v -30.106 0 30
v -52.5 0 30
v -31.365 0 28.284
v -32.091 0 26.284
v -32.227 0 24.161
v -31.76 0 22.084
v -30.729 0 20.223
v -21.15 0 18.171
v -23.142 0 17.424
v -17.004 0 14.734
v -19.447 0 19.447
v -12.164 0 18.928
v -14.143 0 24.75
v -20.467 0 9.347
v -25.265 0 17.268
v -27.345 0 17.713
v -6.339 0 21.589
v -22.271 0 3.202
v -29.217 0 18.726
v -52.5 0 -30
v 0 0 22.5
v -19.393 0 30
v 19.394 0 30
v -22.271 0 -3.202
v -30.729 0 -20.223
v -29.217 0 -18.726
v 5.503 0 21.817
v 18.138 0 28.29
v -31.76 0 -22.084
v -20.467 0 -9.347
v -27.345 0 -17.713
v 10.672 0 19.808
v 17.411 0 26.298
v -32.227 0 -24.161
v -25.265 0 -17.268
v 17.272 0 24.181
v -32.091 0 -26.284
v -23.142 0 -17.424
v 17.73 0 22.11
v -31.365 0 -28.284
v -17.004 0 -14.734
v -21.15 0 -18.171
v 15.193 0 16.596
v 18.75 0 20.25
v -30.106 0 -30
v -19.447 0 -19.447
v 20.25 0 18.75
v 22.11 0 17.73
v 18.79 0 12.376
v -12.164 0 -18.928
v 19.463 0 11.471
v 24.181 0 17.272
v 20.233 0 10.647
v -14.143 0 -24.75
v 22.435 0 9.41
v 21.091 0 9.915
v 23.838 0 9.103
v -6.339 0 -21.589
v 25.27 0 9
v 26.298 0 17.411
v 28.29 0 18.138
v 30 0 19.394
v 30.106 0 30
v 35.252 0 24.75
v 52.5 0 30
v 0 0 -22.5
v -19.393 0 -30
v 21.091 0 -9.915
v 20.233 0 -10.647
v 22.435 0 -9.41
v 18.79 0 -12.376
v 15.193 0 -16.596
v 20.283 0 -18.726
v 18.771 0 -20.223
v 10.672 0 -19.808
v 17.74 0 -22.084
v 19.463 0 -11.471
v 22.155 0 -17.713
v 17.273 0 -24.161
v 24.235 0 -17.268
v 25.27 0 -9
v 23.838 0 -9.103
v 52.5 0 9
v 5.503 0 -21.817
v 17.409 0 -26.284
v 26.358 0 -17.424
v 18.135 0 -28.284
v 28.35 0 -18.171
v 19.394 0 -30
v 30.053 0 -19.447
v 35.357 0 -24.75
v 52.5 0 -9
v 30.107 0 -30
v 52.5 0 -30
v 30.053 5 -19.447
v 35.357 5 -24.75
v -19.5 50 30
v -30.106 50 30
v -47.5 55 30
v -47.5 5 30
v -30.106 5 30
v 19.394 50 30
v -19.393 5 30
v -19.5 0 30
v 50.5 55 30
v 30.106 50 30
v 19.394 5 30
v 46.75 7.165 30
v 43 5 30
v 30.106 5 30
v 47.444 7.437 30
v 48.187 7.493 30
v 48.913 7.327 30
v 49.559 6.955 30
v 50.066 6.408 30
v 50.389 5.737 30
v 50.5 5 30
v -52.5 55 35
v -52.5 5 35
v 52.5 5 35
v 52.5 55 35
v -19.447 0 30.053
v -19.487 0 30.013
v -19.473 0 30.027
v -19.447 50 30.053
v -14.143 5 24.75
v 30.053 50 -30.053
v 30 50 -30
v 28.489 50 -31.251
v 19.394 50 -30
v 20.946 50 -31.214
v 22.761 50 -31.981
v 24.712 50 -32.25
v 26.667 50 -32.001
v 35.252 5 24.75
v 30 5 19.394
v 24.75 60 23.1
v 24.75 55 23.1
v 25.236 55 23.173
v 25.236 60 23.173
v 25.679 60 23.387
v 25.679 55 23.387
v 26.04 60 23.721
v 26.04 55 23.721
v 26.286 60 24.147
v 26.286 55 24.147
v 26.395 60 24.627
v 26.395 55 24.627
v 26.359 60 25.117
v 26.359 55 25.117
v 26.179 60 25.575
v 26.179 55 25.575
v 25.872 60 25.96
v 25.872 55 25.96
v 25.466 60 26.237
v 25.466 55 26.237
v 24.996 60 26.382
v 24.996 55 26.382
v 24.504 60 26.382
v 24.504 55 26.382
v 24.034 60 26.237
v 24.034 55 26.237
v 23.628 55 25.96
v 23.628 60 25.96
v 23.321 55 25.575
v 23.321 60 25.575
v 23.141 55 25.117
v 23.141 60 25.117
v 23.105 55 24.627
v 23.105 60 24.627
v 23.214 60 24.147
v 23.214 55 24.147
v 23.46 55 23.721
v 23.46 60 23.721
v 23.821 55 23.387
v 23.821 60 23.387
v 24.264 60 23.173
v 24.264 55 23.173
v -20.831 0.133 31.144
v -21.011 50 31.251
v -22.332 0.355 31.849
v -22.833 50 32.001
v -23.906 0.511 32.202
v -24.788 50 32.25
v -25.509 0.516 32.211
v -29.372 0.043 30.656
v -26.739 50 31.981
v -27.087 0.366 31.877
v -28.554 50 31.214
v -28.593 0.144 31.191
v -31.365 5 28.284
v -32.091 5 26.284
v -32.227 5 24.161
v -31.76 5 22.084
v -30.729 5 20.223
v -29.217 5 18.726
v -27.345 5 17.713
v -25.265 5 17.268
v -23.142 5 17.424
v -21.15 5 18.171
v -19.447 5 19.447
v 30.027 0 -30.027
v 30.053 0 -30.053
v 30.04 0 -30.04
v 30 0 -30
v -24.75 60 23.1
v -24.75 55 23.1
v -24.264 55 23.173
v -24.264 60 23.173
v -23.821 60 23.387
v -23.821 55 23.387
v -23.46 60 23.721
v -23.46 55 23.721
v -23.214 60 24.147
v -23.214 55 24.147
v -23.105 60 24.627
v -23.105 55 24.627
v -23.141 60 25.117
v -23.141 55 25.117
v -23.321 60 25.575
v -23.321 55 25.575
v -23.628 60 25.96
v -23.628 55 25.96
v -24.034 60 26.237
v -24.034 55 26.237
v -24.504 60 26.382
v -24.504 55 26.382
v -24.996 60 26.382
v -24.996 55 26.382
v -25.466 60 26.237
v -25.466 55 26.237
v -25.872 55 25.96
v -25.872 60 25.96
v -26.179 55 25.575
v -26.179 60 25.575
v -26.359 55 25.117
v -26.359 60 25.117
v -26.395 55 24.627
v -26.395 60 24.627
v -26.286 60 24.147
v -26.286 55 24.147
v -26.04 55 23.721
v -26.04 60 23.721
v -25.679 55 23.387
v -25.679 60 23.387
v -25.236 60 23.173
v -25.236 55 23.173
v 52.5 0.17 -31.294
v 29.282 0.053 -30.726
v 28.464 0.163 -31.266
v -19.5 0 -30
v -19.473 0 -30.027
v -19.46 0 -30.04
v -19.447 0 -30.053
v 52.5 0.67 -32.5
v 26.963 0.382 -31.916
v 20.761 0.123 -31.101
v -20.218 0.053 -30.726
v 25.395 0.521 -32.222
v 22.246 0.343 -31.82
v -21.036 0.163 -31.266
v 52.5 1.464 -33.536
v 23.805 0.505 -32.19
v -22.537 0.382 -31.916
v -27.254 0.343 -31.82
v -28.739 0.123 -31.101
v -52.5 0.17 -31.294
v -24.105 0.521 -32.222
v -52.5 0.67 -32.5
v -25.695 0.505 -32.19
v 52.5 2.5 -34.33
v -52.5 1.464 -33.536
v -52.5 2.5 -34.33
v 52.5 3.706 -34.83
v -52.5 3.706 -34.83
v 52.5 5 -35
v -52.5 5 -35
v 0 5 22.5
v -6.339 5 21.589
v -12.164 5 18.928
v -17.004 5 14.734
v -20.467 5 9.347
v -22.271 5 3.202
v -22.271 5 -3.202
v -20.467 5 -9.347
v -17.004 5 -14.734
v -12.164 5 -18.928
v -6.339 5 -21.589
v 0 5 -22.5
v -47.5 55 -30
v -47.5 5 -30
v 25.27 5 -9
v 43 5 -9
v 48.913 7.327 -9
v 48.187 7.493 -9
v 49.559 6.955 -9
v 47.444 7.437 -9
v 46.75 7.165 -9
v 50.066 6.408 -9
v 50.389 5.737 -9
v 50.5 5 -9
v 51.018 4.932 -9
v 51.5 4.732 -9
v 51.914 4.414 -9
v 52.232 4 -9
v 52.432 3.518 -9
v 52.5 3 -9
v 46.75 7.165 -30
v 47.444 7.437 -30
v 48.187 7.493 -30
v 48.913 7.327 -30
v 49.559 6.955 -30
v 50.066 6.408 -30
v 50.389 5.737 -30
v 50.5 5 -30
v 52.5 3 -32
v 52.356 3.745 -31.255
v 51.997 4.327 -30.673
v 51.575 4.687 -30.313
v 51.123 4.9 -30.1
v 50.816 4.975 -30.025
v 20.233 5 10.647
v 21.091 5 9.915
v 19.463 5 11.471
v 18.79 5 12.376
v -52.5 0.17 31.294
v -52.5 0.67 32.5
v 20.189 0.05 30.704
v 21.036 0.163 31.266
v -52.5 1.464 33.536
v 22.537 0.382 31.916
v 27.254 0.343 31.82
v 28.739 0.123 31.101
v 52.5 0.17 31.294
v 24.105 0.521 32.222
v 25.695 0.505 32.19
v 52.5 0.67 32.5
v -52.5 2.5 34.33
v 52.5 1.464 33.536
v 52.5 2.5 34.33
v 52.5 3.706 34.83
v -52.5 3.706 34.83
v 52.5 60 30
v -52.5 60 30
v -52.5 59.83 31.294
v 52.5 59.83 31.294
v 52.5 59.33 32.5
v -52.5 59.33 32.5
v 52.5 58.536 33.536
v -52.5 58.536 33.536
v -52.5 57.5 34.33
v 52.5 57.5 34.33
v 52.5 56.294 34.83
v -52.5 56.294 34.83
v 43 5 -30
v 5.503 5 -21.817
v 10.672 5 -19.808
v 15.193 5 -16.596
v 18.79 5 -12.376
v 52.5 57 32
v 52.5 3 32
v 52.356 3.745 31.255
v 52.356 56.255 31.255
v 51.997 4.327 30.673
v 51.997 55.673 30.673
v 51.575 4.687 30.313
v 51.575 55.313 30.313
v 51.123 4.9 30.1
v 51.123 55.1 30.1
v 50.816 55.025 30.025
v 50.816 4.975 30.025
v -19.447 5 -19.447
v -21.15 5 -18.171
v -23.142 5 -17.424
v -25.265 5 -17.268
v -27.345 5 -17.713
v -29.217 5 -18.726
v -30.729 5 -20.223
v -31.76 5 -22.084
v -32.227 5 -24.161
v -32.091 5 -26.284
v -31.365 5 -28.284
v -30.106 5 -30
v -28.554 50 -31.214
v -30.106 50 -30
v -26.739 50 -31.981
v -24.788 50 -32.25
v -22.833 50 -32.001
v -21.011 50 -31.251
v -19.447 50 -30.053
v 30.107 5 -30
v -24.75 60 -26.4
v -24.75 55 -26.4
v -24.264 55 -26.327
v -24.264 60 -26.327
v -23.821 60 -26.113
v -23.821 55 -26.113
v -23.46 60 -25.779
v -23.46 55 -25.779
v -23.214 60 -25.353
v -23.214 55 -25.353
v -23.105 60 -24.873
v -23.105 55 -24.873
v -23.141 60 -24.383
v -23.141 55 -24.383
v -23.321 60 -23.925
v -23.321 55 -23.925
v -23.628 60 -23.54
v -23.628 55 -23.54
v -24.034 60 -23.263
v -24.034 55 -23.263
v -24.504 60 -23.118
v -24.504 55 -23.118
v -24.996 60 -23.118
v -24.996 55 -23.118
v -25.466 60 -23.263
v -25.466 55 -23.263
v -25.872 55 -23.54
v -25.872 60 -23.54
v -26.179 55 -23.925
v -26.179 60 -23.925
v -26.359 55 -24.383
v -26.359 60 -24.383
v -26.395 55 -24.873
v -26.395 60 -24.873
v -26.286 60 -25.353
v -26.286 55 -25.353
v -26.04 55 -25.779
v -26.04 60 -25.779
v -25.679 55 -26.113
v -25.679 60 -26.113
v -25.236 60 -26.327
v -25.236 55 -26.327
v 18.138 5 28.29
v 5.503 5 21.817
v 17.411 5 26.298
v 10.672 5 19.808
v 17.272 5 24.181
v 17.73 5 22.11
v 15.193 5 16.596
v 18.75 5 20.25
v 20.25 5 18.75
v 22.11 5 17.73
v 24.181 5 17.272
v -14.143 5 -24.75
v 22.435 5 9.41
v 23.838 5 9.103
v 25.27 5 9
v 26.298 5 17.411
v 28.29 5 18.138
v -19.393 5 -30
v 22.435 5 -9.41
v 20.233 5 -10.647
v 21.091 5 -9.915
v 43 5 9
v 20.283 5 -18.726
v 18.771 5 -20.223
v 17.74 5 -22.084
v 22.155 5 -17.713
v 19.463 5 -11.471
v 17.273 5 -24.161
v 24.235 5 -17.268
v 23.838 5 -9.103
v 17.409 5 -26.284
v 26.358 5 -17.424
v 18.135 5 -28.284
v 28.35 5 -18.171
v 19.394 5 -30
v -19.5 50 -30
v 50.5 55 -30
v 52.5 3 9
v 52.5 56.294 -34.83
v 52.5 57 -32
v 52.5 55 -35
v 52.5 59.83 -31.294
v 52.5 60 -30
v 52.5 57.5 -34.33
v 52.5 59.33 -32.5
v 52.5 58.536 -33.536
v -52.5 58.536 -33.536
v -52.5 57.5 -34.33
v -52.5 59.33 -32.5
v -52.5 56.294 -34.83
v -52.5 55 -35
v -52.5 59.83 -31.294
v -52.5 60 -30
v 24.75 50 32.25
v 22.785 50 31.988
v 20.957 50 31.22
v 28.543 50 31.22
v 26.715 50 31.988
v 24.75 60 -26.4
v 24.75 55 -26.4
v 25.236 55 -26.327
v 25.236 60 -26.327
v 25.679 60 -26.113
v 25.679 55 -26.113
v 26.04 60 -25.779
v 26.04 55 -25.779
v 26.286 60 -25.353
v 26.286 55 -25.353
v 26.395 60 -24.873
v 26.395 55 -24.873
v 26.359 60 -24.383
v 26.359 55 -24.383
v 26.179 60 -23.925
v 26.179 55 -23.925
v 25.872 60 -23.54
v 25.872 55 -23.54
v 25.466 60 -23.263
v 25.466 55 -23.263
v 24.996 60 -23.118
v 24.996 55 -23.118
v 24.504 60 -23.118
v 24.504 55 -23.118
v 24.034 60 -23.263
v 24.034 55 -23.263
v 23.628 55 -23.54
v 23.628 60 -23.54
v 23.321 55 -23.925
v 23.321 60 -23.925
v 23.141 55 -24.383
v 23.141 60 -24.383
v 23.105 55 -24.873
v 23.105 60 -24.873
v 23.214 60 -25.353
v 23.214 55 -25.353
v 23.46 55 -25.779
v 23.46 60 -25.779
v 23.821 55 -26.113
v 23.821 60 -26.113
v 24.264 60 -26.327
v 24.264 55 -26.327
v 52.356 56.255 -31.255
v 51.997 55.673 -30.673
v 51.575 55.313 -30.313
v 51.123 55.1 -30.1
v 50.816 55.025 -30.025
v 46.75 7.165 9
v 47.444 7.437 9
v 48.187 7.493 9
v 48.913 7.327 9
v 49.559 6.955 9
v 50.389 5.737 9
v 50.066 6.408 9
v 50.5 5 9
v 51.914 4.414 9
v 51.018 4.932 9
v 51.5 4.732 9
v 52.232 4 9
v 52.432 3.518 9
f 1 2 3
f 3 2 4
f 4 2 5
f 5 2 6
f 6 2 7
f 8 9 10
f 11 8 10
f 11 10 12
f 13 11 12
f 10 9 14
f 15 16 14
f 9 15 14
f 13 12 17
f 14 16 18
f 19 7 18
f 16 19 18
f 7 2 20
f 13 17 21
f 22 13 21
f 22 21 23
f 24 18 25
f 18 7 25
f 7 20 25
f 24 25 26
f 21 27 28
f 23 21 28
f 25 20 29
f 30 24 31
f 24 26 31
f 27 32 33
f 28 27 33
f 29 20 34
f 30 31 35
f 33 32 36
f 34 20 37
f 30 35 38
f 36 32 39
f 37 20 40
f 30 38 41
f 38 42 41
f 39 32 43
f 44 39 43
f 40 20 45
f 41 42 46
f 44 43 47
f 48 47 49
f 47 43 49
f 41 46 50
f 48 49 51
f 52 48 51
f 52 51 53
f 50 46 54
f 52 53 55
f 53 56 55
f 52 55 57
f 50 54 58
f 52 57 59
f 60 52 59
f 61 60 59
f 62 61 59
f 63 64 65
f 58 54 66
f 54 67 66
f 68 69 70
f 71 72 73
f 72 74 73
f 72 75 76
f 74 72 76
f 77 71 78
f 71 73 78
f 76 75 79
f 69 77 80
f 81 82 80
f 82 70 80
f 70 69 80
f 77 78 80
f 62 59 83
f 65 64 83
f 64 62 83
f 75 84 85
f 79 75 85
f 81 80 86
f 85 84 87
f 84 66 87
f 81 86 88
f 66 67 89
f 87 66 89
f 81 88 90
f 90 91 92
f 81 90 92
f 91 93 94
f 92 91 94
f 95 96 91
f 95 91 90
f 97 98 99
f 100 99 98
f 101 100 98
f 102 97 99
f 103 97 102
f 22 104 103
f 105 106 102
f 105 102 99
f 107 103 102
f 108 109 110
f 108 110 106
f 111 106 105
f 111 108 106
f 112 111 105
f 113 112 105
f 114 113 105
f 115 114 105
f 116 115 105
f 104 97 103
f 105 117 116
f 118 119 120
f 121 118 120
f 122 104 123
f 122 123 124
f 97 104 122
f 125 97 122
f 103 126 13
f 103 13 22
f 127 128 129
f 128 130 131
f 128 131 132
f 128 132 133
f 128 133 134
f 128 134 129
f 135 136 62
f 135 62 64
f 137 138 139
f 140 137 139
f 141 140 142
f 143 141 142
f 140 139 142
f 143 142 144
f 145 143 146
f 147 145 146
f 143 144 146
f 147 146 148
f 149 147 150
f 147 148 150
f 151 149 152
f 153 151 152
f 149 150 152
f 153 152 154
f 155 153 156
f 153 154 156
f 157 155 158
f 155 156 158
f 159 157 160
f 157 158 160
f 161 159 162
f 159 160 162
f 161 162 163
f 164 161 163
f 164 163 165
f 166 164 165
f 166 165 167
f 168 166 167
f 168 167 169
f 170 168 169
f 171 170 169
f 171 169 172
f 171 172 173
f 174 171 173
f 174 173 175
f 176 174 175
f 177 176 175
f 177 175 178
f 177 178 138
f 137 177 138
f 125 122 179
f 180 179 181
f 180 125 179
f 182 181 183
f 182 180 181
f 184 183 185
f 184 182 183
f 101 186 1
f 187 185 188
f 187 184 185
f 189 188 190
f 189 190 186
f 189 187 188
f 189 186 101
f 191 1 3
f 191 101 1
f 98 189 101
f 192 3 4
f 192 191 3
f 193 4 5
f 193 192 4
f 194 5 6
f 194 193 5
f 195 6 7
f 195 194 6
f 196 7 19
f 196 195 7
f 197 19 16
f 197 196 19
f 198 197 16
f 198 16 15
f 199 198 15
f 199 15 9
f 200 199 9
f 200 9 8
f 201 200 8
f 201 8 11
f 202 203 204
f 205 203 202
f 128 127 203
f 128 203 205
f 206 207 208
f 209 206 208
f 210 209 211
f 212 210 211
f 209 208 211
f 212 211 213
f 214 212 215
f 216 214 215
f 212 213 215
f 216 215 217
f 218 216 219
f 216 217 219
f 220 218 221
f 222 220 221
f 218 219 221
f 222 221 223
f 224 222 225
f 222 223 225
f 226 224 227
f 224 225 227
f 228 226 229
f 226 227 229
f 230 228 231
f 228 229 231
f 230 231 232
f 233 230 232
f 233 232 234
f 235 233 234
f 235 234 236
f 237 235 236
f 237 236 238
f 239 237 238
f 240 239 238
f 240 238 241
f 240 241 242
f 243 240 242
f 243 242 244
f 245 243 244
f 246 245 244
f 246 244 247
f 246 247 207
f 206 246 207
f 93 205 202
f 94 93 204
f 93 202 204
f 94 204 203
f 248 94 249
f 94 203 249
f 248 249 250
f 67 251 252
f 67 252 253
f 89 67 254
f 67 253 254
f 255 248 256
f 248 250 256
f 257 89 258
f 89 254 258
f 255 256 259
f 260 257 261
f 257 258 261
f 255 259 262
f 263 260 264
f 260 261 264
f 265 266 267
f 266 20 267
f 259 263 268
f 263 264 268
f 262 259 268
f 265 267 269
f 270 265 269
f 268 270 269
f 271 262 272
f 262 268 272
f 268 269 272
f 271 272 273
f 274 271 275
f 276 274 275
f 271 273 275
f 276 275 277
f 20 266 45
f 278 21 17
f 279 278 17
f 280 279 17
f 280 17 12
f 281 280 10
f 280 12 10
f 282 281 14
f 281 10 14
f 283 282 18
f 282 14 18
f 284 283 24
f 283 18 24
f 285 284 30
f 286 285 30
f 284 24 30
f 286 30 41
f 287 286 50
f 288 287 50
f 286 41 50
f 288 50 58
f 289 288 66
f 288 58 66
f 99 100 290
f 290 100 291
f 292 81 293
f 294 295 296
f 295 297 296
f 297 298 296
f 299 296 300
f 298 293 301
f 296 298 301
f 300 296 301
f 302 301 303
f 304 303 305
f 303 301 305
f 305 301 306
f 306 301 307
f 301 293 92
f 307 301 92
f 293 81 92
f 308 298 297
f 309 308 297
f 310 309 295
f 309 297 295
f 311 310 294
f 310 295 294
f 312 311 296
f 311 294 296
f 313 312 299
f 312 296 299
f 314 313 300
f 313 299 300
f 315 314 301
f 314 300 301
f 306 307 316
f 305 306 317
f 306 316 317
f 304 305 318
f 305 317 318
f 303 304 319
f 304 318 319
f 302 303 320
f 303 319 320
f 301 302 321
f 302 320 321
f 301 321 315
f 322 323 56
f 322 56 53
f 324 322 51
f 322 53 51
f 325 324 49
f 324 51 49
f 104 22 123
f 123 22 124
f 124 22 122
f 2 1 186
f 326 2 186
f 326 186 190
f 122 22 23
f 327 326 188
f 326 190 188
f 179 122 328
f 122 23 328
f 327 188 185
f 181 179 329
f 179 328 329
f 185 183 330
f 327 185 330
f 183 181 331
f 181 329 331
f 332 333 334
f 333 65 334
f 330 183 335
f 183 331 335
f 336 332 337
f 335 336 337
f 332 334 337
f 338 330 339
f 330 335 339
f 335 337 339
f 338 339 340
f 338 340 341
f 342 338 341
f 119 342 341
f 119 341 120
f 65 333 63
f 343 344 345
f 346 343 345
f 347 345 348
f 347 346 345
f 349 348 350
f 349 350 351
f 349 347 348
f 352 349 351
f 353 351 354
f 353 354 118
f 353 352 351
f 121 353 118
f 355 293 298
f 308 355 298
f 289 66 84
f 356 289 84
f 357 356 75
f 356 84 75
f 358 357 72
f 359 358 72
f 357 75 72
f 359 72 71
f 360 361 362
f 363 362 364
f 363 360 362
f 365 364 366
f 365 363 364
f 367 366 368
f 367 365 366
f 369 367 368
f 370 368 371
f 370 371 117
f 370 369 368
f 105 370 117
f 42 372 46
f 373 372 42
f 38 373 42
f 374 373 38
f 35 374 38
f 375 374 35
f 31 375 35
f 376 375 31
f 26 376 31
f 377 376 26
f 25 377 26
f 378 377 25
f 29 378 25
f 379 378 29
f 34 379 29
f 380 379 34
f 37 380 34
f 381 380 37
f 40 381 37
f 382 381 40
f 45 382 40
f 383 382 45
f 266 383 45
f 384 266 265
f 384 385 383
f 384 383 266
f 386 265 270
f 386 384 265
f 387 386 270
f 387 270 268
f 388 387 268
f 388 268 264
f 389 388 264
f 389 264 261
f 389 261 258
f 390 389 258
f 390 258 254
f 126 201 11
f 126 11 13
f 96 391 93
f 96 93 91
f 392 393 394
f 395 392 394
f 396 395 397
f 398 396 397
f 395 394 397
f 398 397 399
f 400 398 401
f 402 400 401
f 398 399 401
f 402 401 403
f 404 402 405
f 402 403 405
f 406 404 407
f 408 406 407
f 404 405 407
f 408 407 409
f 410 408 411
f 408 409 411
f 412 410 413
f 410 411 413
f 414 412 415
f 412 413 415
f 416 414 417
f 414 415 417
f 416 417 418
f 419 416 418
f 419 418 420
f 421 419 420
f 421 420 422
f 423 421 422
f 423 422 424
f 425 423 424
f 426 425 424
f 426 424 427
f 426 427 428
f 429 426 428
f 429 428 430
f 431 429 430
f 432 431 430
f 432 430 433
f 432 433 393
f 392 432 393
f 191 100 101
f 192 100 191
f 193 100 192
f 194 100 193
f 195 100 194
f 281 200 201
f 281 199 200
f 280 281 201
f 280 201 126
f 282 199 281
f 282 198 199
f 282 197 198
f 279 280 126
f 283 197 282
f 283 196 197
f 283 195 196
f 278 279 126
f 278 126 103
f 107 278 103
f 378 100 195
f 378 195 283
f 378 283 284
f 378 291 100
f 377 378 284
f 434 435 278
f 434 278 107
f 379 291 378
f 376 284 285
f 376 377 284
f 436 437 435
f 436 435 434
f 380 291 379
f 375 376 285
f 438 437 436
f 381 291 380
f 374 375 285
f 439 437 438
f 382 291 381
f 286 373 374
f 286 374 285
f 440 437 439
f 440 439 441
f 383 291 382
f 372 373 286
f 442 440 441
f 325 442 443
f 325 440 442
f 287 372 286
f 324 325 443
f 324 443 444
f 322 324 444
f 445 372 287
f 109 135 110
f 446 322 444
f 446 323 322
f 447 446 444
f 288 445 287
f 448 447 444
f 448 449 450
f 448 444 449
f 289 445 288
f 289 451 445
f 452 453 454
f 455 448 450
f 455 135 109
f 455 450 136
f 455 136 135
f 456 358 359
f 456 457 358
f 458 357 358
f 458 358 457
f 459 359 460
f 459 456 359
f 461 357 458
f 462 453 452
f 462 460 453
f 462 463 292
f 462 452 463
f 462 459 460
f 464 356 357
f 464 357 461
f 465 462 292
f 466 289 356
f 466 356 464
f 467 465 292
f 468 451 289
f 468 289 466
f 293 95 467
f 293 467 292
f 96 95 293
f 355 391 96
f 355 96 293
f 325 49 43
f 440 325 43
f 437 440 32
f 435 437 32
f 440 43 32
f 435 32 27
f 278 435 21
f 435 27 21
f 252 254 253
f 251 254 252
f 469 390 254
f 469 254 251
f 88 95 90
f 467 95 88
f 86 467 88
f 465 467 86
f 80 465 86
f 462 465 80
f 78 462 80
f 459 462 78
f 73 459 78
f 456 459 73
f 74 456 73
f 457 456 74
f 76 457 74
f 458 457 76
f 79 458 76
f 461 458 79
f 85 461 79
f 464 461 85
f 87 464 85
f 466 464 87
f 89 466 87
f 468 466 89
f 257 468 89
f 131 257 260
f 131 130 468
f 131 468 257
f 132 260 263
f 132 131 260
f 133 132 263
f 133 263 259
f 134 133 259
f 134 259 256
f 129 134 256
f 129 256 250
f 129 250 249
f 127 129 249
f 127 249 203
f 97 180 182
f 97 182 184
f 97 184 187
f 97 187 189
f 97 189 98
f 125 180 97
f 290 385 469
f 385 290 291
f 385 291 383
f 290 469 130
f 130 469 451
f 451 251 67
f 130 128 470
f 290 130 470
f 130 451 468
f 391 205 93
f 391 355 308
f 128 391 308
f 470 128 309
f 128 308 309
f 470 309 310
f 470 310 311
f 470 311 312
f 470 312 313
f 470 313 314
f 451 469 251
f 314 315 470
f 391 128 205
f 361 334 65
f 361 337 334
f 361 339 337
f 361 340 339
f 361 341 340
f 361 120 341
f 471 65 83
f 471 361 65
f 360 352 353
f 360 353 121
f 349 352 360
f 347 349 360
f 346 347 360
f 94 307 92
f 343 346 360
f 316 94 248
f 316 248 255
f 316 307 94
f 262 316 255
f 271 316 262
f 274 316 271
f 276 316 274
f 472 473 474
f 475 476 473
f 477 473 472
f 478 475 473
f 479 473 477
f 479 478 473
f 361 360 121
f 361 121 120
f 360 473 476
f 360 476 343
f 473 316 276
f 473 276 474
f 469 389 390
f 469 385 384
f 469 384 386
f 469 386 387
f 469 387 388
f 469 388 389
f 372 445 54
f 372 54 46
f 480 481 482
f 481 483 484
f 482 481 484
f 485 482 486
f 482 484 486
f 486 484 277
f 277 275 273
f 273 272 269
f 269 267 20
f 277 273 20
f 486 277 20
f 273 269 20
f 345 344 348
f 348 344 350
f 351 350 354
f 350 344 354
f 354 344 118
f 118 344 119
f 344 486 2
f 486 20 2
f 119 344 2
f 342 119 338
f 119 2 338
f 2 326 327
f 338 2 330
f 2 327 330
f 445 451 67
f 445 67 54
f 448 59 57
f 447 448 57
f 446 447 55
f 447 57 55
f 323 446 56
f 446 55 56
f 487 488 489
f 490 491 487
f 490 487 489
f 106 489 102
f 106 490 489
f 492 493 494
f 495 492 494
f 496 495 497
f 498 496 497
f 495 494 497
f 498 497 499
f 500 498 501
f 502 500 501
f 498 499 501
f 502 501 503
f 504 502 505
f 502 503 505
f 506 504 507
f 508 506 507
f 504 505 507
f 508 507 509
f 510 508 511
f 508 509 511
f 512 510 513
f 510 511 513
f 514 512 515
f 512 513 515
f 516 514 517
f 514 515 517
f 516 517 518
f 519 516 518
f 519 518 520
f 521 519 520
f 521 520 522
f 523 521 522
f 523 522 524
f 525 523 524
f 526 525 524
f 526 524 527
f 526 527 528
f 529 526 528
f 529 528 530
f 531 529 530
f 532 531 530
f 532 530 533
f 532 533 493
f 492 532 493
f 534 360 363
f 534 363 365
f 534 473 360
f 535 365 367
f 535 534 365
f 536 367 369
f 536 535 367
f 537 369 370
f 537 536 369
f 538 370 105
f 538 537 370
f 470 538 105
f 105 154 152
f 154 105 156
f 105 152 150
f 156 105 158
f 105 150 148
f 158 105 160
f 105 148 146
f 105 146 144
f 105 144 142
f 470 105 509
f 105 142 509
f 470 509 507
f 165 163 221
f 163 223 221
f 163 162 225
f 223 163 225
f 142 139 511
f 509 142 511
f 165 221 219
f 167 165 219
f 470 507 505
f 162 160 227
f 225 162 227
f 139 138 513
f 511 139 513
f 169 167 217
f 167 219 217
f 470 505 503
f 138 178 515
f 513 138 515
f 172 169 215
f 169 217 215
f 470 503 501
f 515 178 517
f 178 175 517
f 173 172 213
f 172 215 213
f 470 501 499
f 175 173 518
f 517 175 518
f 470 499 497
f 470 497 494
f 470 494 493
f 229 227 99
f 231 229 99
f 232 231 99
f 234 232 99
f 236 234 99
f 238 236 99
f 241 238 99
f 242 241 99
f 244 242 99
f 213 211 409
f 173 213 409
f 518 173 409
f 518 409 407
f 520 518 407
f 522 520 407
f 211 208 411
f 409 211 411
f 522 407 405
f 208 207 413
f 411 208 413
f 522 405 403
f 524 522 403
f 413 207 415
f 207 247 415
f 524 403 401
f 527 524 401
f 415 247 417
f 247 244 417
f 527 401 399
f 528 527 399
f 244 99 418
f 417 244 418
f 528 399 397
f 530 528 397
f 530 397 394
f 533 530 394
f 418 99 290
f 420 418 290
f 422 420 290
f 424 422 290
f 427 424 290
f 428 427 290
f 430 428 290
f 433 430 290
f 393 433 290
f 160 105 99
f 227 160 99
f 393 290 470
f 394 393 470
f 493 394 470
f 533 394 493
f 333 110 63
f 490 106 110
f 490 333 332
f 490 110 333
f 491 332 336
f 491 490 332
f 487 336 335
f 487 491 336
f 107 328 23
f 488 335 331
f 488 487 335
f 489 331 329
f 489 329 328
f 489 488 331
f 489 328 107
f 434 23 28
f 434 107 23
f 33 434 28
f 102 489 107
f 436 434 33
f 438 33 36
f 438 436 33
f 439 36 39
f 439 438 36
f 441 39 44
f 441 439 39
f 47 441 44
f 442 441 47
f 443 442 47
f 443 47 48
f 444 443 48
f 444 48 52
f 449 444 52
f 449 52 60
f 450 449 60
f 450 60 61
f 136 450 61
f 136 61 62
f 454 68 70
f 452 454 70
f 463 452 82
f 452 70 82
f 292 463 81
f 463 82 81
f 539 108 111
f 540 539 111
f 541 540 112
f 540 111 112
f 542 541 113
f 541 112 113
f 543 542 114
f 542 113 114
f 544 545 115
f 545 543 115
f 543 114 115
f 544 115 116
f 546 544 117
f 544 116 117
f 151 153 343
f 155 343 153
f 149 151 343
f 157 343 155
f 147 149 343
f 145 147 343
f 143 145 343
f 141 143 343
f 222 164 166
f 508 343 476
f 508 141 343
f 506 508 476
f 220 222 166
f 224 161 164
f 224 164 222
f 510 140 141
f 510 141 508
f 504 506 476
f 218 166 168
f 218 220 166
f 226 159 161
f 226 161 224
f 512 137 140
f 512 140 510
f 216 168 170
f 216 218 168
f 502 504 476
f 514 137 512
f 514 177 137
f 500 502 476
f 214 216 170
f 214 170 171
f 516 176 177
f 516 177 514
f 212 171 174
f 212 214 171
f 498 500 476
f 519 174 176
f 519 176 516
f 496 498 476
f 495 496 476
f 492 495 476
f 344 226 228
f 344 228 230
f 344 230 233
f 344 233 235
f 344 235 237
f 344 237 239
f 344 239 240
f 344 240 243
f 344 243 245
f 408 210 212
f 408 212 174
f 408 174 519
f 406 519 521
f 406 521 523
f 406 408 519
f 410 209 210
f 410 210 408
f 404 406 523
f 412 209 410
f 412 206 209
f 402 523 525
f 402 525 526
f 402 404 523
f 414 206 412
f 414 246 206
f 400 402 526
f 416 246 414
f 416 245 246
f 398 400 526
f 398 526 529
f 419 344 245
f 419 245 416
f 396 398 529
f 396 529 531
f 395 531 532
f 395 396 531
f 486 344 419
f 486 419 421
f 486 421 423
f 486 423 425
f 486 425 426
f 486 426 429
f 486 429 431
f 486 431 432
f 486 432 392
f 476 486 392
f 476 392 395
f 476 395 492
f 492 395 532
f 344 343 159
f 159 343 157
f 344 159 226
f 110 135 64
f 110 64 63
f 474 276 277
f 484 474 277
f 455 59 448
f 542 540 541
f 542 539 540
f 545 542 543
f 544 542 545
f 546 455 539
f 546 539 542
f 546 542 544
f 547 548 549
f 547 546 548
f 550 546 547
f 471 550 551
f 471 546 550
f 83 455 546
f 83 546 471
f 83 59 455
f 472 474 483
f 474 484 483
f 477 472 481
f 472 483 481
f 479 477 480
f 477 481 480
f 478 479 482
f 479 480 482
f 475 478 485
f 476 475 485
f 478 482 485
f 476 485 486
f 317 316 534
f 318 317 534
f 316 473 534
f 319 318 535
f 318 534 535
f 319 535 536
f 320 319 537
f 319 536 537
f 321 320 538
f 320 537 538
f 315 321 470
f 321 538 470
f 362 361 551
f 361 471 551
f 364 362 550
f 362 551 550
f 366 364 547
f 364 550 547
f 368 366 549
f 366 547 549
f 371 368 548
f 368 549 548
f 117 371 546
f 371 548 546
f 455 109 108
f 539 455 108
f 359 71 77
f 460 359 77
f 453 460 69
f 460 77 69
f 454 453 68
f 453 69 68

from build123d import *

# Parameters (mm, degrees)
EXTRUDE_1_DEPTH     = 5
SKETCH_3_W          = 100
SKETCH_3_H          = 5
SKETCH_3_W_2        = 5
SKETCH_3_H_2        = 60
EXTRUDE_2_DEPTH     = 55
SKETCH_4_W          = 60
SKETCH_4_H          = 5
EXTRUDE_3_DEPTH     = 100
CUT_EXTRUDE_1_REACH = 89.07
FILLET_2_R          = 10
FILLET_3_R          = 10
FILLET_4_R          = 5
FILLET_5_R          = 2
CUT_EXTRUDE_2_REACH = 85.703
SKETCH_6_R          = 1.65
CUT_EXTRUDE_START   = -50
CUT_EXTRUDE_3_DEPTH = 50
EXTRUDE_4_DEPTH     = 60
SKETCH_10_W         = 7.5
SKETCH_10_H         = 18
CUT_EXTRUDE_4_DEPTH = 5


# Read off the part's stored shape, not the designer's step: 切除-拉伸3
with BuildPart() as part:
    # 草图1 → 凸台-拉伸1 (new body)
    with BuildSketch(Plane(origin=(0, 0, 0), x_dir=(1, 0, 0), z_dir=(0, 1, 0))):
        Polygon((-52.5, 35), (-52.5, -35), (52.5, -35), (52.5, -9), (-20, -9), (-20, 9), (52.5, 9), (52.5, 35), align=None)
    extrude(amount=EXTRUDE_1_DEPTH)

    # 草图3 → 凸台-拉伸2 (add)
    with BuildSketch(Plane(origin=(0, 5, 0), x_dir=(1, 0, 0), z_dir=(0, 1, 0))):
        with Locations((2.5, 32.5)):
            Rectangle(SKETCH_3_W, SKETCH_3_H)
        with Locations((-50, 32.5)):
            Rectangle(SKETCH_3_W_2, SKETCH_3_H)
        with Locations((-50, 0)):
            Rectangle(SKETCH_3_W_2, SKETCH_3_H_2)
        with Locations((2.5, -32.5)):
            Rectangle(SKETCH_3_W, SKETCH_3_H)
        with Locations((-50, -32.5)):
            Rectangle(SKETCH_3_W_2, SKETCH_3_H)
    extrude(amount=EXTRUDE_2_DEPTH)

    # 草图4 → 凸台-拉伸3 (add)
    with BuildSketch(Plane(origin=(-47.5, 0, 0), x_dir=(0, 0, -1), z_dir=(1, 0, 0))):
        with Locations((0, 57.5)):
            Rectangle(SKETCH_4_W, SKETCH_4_H)
    extrude(amount=EXTRUDE_3_DEPTH)

    # 草图5 → 切除-拉伸1 (cut, up to next)
    with BuildSketch(Plane.XZ, mode=Mode.PRIVATE) as cut_extrude_1_sk1:
        with BuildLine():
            Line((19.852941176, 10.588235294), (0, 22.5))
            ThreePointArc((0, 22.5), (-22.5, 0), (0, -22.5))
            Line((0, -22.5), (19.852941176, -10.588235294))
            ThreePointArc((19.852941176, -10.588235294), (20.252840641, -9.801655267), (20.621590627, -9))
            Line((20.621590627, -9), (-20, -9))
            Line((-20, -9), (-20, 9))
            Line((-20, 9), (20.621590627, 9))
            ThreePointArc((20.621590627, 9), (20.252840641, 9.801655267), (19.852941176, 10.588235294))
        make_face()
    cut_extrude_1_tool1 = extrude(cut_extrude_1_sk1.sketch, amount=-CUT_EXTRUDE_1_REACH, mode=Mode.PRIVATE) & part.part
    # 草图5 → 切除-拉伸1 (cut, up to next)
    with BuildSketch(Plane.XZ, mode=Mode.PRIVATE) as cut_extrude_1_sk2:
        with BuildLine():
            Line((22.5, 9), (19.852941176, 10.588235294))
            ThreePointArc((19.852941176, 10.588235294), (20.252840641, 9.801655267), (20.621590627, 9))
            Line((20.621590627, 9), (22.5, 9))
        make_face()
    cut_extrude_1_tool2 = extrude(cut_extrude_1_sk2.sketch, amount=-CUT_EXTRUDE_1_REACH, mode=Mode.PRIVATE) & part.part
    # 草图5 → 切除-拉伸1 (cut, up to next)
    with BuildSketch(Plane.XZ, mode=Mode.PRIVATE) as cut_extrude_1_sk3:
        with BuildLine():
            ThreePointArc((20.621590627, -9), (20.252840641, -9.801655267), (19.852941176, -10.588235294))
            Line((19.852941176, -10.588235294), (22.5, -9))
            Line((22.5, -9), (20.621590627, -9))
        make_face()
    cut_extrude_1_tool3 = extrude(cut_extrude_1_sk3.sketch, amount=-CUT_EXTRUDE_1_REACH, mode=Mode.PRIVATE) & part.part
    # 草图5 → 切除-拉伸1 (cut, up to next)
    with BuildSketch(Plane.XZ, mode=Mode.PRIVATE) as cut_extrude_1_sk4:
        with BuildLine():
            ThreePointArc((19.852941176, 10.588235294), (11.576154497, 19.293590829), (0, 22.5))
            Line((0, 22.5), (19.852941176, 10.588235294))
        make_face()
    cut_extrude_1_tool4 = extrude(cut_extrude_1_sk4.sketch, amount=-CUT_EXTRUDE_1_REACH, mode=Mode.PRIVATE) & part.part
    # 草图5 → 切除-拉伸1 (cut, up to next)
    with BuildSketch(Plane.XZ, mode=Mode.PRIVATE) as cut_extrude_1_sk5:
        with BuildLine():
            Line((19.852941176, -10.588235294), (0, -22.5))
            ThreePointArc((0, -22.5), (11.576154497, -19.293590829), (19.852941176, -10.588235294))
        make_face()
    cut_extrude_1_tool5 = extrude(cut_extrude_1_sk5.sketch, amount=-CUT_EXTRUDE_1_REACH, mode=Mode.PRIVATE) & part.part
    add(cut_extrude_1_tool1.solids().sort_by_distance((19.691832, 0, -9.530147))[0], mode=Mode.SUBTRACT)
    add(cut_extrude_1_tool2.solids().sort_by_distance((21.001859, 0, 9.525708))[0], mode=Mode.SUBTRACT)
    add(cut_extrude_1_tool3.solids().sort_by_distance((21.001859, 0, -9.525708))[0], mode=Mode.SUBTRACT)
    add(cut_extrude_1_tool4.solids().sort_by_distance((10.590548, 0, 17.650913))[0], mode=Mode.SUBTRACT)
    add(cut_extrude_1_tool5.solids().sort_by_distance((10.590548, 0, -17.650913))[0], mode=Mode.SUBTRACT)

    # 圆角2
    # the kernel refuses this fillet: 10 mm, written as the material it takes off along each edge
    with BuildSketch(Plane(origin=(19.852941176, -6.249770084, 10.588235294), x_dir=(-0.5108705169858321, 0, 0.8596576730737815), z_dir=(0, 1, 0))) as fillet_2_piece_1:
        with BuildLine():
            CenterArc((2.542282374, 9.989311313), FILLET_2_R, 241.685588385, 25.665066698)
            Line((-2.200814232, 1.185730531), (0, 0))
            ThreePointArc((0, 0), (1.040024608, 0.024049546), (2.080049215, 0))
        make_face()
    extrude(amount=17.499540168, mode=Mode.SUBTRACT)
    with BuildSketch(Plane(origin=(22.5, -6.924599124, 9), x_dir=(1, 0, 0), z_dir=(0, 1, 0))) as fillet_2_piece_2:
        with BuildLine():
            CenterArc((FILLET_2_R * 0.276983964948, -FILLET_2_R), FILLET_2_R, 90, 30.963756532)
            Line((-FILLET_2_R * 0.237511790479, -FILLET_2_R * 0.142507074287), (0, 0))
            Line((0, 0), (FILLET_2_R * 0.276983964948, 0))
        make_face()
    extrude(amount=18.849198247, mode=Mode.SUBTRACT)

    # 圆角3
    # the kernel refuses this fillet: 10 mm, written as the material it takes off along each edge
    with BuildSketch(Plane(origin=(22.5, -6.924599124, -9), x_dir=(1, 0, 0), z_dir=(0, 1, 0))) as fillet_3_piece_1:
        with BuildLine():
            CenterArc((FILLET_3_R * 0.276983964948, FILLET_3_R), FILLET_3_R, 239.036243468, 30.963756532)
            Line((-FILLET_3_R * 0.237511790479, FILLET_3_R * 0.142507074287), (0, 0))
            Line((0, 0), (FILLET_3_R * 0.276983964948, 0))
        make_face()
    extrude(amount=18.849198247, mode=Mode.SUBTRACT)
    with BuildSketch(Plane(origin=(19.852941176, -6.249770084, -10.588235294), x_dir=(0.857492925712544, 0, 0.5144957554275268), z_dir=(0, 1, 0))) as fillet_3_piece_2:
        with BuildLine():
            CenterArc((2.499908034, 10), FILLET_3_R, 244.334933302, 25.665066698)
            ThreePointArc((-1.83118813, 0.986587437), (-0.904187133, 0.514465931), (0, 0))
            Line((0, 0), (2.499908034, 0))
        make_face()
    extrude(amount=17.499540168, mode=Mode.SUBTRACT)

    # 圆角4
    fillet_4_edges = [part.edges().sort_by_distance(p)[0] for p in [
        (0, 0, 35),
        (0, 0, -35),
        (0, 60, -35),
        (0, 60, 35),
    ]]
    fillet(fillet_4_edges, radius=FILLET_4_R)

    # 圆角5
    fillet_5_edges = [part.edges().sort_by_distance(p)[0] for p in [
        (52.5, 5, 19.5),
        (52.5, 5, -19.5),
        (52.5, 30, -30),
        (52.5, 30, 30),
        (52.5, 55, 0),
    ]]
    fillet(fillet_5_edges, radius=FILLET_5_R)

    # 草图6 → 切除-拉伸2 (cut, up to next)
    with BuildSketch(Plane.XZ.offset(-55), mode=Mode.PRIVATE) as cut_extrude_2_sk1:
        with Locations(Location((-24.75, 24.75, 0), (0, 0, 270))):
            Circle(SKETCH_6_R)
    cut_extrude_2_tool1 = extrude(cut_extrude_2_sk1.sketch, amount=-CUT_EXTRUDE_2_REACH, mode=Mode.PRIVATE) & part.part
    # 草图6 → 切除-拉伸2 (cut, up to next)
    with BuildSketch(Plane.XZ.offset(-55), mode=Mode.PRIVATE) as cut_extrude_2_sk2:
        with Locations(Location((24.75, 24.75, 0), (0, 0, 270))):
            Circle(SKETCH_6_R)
    cut_extrude_2_tool2 = extrude(cut_extrude_2_sk2.sketch, amount=-CUT_EXTRUDE_2_REACH, mode=Mode.PRIVATE) & part.part
    # 草图6 → 切除-拉伸2 (cut, up to next)
    with BuildSketch(Plane.XZ.offset(-55), mode=Mode.PRIVATE) as cut_extrude_2_sk3:
        with Locations(Location((24.75, -24.75, 0), (0, 0, 270))):
            Circle(SKETCH_6_R)
    cut_extrude_2_tool3 = extrude(cut_extrude_2_sk3.sketch, amount=-CUT_EXTRUDE_2_REACH, mode=Mode.PRIVATE) & part.part
    # 草图6 → 切除-拉伸2 (cut, up to next)
    with BuildSketch(Plane.XZ.offset(-55), mode=Mode.PRIVATE) as cut_extrude_2_sk4:
        with Locations(Location((-24.75, -24.75, 0), (0, 0, 270))):
            Circle(SKETCH_6_R)
    cut_extrude_2_tool4 = extrude(cut_extrude_2_sk4.sketch, amount=-CUT_EXTRUDE_2_REACH, mode=Mode.PRIVATE) & part.part
    add(cut_extrude_2_tool1.solids().sort_by_distance((-24.75, 55, 24.75))[0], mode=Mode.SUBTRACT)
    add(cut_extrude_2_tool2.solids().sort_by_distance((24.75, 55, 24.75))[0], mode=Mode.SUBTRACT)
    add(cut_extrude_2_tool3.solids().sort_by_distance((24.75, 55, -24.75))[0], mode=Mode.SUBTRACT)
    add(cut_extrude_2_tool4.solids().sort_by_distance((-24.75, 55, -24.75))[0], mode=Mode.SUBTRACT)

    # 切除-拉伸3 outline → 切除-拉伸3 (cut)
    with BuildSketch(Plane.XZ.offset(CUT_EXTRUDE_START)):
        with BuildLine():
            Line((30, 19.393928679), (35.25210063, 24.75))
            Line((35.25210063, 24.75), (30.106071321, 30))
            ThreePointArc((30.106071321, 30), (17.250375047, 24.82500375), (30, 19.393928679))
        make_face()
        with BuildLine():
            Line((-14.143398282, 24.75), (-19.393398282, 30))
            Line((-19.393398282, 30), (-19.5, 30))
            Line((-19.5, 30), (-19.446699141, 30.053300859))
            ThreePointArc((-19.446699141, 30.053300859), (-32.25, 24.75), (-19.446699141, 19.446699141))
            Line((-19.446699141, 19.446699141), (-14.143398282, 24.75))
        make_face()
        with BuildLine():
            Line((-19.5, -30), (-19.393398282, -30))
            Line((-19.393398282, -30), (-14.143398282, -24.75))
            Line((-14.143398282, -24.75), (-19.446699141, -19.446699141))
            ThreePointArc((-19.446699141, -19.446699141), (-32.25, -24.75), (-19.446699141, -30.053300859))
            Line((-19.446699141, -30.053300859), (-19.5, -30))
        make_face()
        with BuildLine():
            Line((35.356601718, -24.75), (30.053300859, -19.446699141))
            ThreePointArc((30.053300859, -19.446699141), (17.25, -24.75), (30.053300859, -30.053300859))
            Line((30.053300859, -30.053300859), (30, -30))
            Line((30, -30), (30.106601718, -30))
            Line((30.106601718, -30), (35.356601718, -24.75))
        make_face()
    extrude(amount=CUT_EXTRUDE_3_DEPTH, mode=Mode.SUBTRACT)

    # 草图9 → 凸台-拉伸4 (add)
    with BuildSketch(Plane(origin=(0, 0, 30), x_dir=(-1, 0, 0), z_dir=(0, 0, -1))):
        with BuildLine():
            Line((-43, 5), (-46.75, 7.165063509))
            ThreePointArc((-46.75, 7.165063509), (-45.834936491, 6.25), (-45.5, 5))
            Line((-45.5, 5), (-43, 5))
        make_face()
        with BuildLine():
            ThreePointArc((-46.75, 7.165063509), (-49.25, 7.165063509), (-50.5, 5))
            Line((-50.5, 5), (-48, 5))
            Line((-48, 5), (-46.75, 7.165063509))
        make_face()
        with BuildLine():
            Line((-46.75, 7.165063509), (-48, 5))
            Line((-48, 5), (-45.5, 5))
            ThreePointArc((-45.5, 5), (-45.834936491, 6.25), (-46.75, 7.165063509))
        make_face()
    extrude(amount=EXTRUDE_4_DEPTH)

    # 草图10 → 切除-拉伸4 (cut)
    with BuildSketch(Plane.XZ.offset(-5)):
        with Locations((46.75, 0)):
            Rectangle(SKETCH_10_W, SKETCH_10_H)
    extrude(amount=-CUT_EXTRUDE_4_DEPTH, mode=Mode.SUBTRACT)


solid = part.part
